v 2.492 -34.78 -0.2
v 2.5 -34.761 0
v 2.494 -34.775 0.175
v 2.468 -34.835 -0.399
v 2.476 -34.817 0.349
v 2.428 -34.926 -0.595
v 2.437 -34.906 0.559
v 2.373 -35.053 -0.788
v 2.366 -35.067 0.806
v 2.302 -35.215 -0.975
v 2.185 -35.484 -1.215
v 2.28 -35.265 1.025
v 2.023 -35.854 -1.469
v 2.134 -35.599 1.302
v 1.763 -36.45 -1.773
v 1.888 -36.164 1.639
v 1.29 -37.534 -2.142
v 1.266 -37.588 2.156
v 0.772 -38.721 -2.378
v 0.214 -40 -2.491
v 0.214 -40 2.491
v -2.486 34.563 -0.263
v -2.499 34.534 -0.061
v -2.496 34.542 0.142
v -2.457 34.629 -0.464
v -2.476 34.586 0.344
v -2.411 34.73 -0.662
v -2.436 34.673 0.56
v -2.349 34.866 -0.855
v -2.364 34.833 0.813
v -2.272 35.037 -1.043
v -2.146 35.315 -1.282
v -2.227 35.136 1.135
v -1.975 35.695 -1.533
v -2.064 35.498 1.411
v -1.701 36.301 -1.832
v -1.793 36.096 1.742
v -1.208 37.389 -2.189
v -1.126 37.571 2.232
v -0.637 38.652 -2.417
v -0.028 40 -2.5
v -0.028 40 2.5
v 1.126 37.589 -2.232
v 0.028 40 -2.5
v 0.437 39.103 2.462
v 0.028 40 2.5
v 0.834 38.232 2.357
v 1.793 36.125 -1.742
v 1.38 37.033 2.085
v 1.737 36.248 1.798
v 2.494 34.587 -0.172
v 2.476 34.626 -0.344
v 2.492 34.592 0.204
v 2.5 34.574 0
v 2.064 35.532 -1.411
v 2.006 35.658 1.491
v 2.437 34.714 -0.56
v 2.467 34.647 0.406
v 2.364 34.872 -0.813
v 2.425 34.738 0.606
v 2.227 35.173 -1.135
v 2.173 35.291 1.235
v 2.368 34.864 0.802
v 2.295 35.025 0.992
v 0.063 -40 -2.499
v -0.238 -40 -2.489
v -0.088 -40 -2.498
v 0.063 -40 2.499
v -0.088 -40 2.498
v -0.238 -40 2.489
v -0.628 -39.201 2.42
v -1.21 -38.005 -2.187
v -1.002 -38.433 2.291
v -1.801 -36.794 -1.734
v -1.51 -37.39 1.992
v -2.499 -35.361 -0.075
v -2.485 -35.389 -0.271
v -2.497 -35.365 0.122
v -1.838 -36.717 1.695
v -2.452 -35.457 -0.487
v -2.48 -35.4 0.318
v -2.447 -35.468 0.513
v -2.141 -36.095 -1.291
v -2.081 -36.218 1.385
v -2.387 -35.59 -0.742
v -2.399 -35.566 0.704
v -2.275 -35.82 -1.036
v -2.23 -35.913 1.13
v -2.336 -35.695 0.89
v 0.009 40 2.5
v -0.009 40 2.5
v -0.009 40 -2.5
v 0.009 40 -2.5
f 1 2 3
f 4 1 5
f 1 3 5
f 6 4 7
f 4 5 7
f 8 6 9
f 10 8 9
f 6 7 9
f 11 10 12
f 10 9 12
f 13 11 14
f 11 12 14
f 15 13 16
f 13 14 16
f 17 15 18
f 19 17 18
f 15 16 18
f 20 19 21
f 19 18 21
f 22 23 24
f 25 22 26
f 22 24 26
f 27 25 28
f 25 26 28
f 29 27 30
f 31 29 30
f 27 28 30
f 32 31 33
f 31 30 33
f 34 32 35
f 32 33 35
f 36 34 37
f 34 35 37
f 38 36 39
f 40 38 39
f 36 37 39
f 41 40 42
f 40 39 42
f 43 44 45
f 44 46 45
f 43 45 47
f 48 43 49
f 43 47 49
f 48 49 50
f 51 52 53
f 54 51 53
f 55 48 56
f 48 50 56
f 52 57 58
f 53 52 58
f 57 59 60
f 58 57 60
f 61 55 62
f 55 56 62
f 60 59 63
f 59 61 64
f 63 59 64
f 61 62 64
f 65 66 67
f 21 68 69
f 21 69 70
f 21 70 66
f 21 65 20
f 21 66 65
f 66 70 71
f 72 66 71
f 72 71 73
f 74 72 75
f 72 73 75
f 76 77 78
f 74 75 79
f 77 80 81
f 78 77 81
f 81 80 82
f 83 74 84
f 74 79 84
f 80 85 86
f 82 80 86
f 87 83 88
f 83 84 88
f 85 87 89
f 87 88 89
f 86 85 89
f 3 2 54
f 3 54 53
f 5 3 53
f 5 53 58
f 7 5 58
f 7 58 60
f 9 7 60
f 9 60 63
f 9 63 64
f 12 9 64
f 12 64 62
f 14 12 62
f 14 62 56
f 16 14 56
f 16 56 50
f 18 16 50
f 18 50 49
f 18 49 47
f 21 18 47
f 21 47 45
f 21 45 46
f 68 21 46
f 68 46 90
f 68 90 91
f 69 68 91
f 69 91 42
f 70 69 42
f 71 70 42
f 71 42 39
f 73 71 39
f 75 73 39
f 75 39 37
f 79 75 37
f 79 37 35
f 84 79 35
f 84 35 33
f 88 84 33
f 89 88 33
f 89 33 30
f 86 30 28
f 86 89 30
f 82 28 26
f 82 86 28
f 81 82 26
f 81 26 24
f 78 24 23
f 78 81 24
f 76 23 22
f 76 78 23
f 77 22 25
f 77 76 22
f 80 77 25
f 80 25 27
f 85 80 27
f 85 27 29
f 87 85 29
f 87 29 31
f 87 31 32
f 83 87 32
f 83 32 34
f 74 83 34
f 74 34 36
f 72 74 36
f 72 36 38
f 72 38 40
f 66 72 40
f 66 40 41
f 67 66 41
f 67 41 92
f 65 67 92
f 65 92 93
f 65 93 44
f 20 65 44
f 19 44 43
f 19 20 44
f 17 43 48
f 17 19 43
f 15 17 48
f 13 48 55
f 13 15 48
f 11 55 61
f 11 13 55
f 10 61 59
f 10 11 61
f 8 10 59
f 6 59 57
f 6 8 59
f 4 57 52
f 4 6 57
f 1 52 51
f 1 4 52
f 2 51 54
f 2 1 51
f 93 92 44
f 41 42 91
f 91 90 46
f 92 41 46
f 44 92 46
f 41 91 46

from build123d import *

# Parameters (mm, degrees)
F0_R     = 2.5
F1_DEPTH = 40
F4_DEPTH = 12.5
F5_DEPTH = 12.5


with BuildPart() as f1:
    # F0 (on Front) → F1 (new body, symmetric)
    with BuildSketch(Plane.XZ):
        Circle(F0_R)
    extrude(amount=F1_DEPTH, both=True)

    # F3 (on Top) → F4 (cut, symmetric)
    with BuildSketch(Plane.XY):
        Polygon((0, -40.4892601073), (-4.2708204128, -31.7243561149), (-4.5337388292, -41.365750134), (5.0189574249, -41.1904491484), (5.2598807418, -31.7243561149), (4.0549240075, -31.1984587461), align=None)
    extrude(amount=F4_DEPTH, both=True, mode=Mode.SUBTRACT)

    # F2 (on Top) → F5 (cut, symmetric)
    with BuildSketch(Plane.XY):
        Polygon((-3.1360695139, 40.8483743668), (-3.1360695139, 33.1261791289), (0, 40.0613993406), (3.1597327907, 33.1261791289), (3.4056627192, 40.8483743668), align=None)
    extrude(amount=F5_DEPTH, both=True, mode=Mode.SUBTRACT)


solid = f1.part
